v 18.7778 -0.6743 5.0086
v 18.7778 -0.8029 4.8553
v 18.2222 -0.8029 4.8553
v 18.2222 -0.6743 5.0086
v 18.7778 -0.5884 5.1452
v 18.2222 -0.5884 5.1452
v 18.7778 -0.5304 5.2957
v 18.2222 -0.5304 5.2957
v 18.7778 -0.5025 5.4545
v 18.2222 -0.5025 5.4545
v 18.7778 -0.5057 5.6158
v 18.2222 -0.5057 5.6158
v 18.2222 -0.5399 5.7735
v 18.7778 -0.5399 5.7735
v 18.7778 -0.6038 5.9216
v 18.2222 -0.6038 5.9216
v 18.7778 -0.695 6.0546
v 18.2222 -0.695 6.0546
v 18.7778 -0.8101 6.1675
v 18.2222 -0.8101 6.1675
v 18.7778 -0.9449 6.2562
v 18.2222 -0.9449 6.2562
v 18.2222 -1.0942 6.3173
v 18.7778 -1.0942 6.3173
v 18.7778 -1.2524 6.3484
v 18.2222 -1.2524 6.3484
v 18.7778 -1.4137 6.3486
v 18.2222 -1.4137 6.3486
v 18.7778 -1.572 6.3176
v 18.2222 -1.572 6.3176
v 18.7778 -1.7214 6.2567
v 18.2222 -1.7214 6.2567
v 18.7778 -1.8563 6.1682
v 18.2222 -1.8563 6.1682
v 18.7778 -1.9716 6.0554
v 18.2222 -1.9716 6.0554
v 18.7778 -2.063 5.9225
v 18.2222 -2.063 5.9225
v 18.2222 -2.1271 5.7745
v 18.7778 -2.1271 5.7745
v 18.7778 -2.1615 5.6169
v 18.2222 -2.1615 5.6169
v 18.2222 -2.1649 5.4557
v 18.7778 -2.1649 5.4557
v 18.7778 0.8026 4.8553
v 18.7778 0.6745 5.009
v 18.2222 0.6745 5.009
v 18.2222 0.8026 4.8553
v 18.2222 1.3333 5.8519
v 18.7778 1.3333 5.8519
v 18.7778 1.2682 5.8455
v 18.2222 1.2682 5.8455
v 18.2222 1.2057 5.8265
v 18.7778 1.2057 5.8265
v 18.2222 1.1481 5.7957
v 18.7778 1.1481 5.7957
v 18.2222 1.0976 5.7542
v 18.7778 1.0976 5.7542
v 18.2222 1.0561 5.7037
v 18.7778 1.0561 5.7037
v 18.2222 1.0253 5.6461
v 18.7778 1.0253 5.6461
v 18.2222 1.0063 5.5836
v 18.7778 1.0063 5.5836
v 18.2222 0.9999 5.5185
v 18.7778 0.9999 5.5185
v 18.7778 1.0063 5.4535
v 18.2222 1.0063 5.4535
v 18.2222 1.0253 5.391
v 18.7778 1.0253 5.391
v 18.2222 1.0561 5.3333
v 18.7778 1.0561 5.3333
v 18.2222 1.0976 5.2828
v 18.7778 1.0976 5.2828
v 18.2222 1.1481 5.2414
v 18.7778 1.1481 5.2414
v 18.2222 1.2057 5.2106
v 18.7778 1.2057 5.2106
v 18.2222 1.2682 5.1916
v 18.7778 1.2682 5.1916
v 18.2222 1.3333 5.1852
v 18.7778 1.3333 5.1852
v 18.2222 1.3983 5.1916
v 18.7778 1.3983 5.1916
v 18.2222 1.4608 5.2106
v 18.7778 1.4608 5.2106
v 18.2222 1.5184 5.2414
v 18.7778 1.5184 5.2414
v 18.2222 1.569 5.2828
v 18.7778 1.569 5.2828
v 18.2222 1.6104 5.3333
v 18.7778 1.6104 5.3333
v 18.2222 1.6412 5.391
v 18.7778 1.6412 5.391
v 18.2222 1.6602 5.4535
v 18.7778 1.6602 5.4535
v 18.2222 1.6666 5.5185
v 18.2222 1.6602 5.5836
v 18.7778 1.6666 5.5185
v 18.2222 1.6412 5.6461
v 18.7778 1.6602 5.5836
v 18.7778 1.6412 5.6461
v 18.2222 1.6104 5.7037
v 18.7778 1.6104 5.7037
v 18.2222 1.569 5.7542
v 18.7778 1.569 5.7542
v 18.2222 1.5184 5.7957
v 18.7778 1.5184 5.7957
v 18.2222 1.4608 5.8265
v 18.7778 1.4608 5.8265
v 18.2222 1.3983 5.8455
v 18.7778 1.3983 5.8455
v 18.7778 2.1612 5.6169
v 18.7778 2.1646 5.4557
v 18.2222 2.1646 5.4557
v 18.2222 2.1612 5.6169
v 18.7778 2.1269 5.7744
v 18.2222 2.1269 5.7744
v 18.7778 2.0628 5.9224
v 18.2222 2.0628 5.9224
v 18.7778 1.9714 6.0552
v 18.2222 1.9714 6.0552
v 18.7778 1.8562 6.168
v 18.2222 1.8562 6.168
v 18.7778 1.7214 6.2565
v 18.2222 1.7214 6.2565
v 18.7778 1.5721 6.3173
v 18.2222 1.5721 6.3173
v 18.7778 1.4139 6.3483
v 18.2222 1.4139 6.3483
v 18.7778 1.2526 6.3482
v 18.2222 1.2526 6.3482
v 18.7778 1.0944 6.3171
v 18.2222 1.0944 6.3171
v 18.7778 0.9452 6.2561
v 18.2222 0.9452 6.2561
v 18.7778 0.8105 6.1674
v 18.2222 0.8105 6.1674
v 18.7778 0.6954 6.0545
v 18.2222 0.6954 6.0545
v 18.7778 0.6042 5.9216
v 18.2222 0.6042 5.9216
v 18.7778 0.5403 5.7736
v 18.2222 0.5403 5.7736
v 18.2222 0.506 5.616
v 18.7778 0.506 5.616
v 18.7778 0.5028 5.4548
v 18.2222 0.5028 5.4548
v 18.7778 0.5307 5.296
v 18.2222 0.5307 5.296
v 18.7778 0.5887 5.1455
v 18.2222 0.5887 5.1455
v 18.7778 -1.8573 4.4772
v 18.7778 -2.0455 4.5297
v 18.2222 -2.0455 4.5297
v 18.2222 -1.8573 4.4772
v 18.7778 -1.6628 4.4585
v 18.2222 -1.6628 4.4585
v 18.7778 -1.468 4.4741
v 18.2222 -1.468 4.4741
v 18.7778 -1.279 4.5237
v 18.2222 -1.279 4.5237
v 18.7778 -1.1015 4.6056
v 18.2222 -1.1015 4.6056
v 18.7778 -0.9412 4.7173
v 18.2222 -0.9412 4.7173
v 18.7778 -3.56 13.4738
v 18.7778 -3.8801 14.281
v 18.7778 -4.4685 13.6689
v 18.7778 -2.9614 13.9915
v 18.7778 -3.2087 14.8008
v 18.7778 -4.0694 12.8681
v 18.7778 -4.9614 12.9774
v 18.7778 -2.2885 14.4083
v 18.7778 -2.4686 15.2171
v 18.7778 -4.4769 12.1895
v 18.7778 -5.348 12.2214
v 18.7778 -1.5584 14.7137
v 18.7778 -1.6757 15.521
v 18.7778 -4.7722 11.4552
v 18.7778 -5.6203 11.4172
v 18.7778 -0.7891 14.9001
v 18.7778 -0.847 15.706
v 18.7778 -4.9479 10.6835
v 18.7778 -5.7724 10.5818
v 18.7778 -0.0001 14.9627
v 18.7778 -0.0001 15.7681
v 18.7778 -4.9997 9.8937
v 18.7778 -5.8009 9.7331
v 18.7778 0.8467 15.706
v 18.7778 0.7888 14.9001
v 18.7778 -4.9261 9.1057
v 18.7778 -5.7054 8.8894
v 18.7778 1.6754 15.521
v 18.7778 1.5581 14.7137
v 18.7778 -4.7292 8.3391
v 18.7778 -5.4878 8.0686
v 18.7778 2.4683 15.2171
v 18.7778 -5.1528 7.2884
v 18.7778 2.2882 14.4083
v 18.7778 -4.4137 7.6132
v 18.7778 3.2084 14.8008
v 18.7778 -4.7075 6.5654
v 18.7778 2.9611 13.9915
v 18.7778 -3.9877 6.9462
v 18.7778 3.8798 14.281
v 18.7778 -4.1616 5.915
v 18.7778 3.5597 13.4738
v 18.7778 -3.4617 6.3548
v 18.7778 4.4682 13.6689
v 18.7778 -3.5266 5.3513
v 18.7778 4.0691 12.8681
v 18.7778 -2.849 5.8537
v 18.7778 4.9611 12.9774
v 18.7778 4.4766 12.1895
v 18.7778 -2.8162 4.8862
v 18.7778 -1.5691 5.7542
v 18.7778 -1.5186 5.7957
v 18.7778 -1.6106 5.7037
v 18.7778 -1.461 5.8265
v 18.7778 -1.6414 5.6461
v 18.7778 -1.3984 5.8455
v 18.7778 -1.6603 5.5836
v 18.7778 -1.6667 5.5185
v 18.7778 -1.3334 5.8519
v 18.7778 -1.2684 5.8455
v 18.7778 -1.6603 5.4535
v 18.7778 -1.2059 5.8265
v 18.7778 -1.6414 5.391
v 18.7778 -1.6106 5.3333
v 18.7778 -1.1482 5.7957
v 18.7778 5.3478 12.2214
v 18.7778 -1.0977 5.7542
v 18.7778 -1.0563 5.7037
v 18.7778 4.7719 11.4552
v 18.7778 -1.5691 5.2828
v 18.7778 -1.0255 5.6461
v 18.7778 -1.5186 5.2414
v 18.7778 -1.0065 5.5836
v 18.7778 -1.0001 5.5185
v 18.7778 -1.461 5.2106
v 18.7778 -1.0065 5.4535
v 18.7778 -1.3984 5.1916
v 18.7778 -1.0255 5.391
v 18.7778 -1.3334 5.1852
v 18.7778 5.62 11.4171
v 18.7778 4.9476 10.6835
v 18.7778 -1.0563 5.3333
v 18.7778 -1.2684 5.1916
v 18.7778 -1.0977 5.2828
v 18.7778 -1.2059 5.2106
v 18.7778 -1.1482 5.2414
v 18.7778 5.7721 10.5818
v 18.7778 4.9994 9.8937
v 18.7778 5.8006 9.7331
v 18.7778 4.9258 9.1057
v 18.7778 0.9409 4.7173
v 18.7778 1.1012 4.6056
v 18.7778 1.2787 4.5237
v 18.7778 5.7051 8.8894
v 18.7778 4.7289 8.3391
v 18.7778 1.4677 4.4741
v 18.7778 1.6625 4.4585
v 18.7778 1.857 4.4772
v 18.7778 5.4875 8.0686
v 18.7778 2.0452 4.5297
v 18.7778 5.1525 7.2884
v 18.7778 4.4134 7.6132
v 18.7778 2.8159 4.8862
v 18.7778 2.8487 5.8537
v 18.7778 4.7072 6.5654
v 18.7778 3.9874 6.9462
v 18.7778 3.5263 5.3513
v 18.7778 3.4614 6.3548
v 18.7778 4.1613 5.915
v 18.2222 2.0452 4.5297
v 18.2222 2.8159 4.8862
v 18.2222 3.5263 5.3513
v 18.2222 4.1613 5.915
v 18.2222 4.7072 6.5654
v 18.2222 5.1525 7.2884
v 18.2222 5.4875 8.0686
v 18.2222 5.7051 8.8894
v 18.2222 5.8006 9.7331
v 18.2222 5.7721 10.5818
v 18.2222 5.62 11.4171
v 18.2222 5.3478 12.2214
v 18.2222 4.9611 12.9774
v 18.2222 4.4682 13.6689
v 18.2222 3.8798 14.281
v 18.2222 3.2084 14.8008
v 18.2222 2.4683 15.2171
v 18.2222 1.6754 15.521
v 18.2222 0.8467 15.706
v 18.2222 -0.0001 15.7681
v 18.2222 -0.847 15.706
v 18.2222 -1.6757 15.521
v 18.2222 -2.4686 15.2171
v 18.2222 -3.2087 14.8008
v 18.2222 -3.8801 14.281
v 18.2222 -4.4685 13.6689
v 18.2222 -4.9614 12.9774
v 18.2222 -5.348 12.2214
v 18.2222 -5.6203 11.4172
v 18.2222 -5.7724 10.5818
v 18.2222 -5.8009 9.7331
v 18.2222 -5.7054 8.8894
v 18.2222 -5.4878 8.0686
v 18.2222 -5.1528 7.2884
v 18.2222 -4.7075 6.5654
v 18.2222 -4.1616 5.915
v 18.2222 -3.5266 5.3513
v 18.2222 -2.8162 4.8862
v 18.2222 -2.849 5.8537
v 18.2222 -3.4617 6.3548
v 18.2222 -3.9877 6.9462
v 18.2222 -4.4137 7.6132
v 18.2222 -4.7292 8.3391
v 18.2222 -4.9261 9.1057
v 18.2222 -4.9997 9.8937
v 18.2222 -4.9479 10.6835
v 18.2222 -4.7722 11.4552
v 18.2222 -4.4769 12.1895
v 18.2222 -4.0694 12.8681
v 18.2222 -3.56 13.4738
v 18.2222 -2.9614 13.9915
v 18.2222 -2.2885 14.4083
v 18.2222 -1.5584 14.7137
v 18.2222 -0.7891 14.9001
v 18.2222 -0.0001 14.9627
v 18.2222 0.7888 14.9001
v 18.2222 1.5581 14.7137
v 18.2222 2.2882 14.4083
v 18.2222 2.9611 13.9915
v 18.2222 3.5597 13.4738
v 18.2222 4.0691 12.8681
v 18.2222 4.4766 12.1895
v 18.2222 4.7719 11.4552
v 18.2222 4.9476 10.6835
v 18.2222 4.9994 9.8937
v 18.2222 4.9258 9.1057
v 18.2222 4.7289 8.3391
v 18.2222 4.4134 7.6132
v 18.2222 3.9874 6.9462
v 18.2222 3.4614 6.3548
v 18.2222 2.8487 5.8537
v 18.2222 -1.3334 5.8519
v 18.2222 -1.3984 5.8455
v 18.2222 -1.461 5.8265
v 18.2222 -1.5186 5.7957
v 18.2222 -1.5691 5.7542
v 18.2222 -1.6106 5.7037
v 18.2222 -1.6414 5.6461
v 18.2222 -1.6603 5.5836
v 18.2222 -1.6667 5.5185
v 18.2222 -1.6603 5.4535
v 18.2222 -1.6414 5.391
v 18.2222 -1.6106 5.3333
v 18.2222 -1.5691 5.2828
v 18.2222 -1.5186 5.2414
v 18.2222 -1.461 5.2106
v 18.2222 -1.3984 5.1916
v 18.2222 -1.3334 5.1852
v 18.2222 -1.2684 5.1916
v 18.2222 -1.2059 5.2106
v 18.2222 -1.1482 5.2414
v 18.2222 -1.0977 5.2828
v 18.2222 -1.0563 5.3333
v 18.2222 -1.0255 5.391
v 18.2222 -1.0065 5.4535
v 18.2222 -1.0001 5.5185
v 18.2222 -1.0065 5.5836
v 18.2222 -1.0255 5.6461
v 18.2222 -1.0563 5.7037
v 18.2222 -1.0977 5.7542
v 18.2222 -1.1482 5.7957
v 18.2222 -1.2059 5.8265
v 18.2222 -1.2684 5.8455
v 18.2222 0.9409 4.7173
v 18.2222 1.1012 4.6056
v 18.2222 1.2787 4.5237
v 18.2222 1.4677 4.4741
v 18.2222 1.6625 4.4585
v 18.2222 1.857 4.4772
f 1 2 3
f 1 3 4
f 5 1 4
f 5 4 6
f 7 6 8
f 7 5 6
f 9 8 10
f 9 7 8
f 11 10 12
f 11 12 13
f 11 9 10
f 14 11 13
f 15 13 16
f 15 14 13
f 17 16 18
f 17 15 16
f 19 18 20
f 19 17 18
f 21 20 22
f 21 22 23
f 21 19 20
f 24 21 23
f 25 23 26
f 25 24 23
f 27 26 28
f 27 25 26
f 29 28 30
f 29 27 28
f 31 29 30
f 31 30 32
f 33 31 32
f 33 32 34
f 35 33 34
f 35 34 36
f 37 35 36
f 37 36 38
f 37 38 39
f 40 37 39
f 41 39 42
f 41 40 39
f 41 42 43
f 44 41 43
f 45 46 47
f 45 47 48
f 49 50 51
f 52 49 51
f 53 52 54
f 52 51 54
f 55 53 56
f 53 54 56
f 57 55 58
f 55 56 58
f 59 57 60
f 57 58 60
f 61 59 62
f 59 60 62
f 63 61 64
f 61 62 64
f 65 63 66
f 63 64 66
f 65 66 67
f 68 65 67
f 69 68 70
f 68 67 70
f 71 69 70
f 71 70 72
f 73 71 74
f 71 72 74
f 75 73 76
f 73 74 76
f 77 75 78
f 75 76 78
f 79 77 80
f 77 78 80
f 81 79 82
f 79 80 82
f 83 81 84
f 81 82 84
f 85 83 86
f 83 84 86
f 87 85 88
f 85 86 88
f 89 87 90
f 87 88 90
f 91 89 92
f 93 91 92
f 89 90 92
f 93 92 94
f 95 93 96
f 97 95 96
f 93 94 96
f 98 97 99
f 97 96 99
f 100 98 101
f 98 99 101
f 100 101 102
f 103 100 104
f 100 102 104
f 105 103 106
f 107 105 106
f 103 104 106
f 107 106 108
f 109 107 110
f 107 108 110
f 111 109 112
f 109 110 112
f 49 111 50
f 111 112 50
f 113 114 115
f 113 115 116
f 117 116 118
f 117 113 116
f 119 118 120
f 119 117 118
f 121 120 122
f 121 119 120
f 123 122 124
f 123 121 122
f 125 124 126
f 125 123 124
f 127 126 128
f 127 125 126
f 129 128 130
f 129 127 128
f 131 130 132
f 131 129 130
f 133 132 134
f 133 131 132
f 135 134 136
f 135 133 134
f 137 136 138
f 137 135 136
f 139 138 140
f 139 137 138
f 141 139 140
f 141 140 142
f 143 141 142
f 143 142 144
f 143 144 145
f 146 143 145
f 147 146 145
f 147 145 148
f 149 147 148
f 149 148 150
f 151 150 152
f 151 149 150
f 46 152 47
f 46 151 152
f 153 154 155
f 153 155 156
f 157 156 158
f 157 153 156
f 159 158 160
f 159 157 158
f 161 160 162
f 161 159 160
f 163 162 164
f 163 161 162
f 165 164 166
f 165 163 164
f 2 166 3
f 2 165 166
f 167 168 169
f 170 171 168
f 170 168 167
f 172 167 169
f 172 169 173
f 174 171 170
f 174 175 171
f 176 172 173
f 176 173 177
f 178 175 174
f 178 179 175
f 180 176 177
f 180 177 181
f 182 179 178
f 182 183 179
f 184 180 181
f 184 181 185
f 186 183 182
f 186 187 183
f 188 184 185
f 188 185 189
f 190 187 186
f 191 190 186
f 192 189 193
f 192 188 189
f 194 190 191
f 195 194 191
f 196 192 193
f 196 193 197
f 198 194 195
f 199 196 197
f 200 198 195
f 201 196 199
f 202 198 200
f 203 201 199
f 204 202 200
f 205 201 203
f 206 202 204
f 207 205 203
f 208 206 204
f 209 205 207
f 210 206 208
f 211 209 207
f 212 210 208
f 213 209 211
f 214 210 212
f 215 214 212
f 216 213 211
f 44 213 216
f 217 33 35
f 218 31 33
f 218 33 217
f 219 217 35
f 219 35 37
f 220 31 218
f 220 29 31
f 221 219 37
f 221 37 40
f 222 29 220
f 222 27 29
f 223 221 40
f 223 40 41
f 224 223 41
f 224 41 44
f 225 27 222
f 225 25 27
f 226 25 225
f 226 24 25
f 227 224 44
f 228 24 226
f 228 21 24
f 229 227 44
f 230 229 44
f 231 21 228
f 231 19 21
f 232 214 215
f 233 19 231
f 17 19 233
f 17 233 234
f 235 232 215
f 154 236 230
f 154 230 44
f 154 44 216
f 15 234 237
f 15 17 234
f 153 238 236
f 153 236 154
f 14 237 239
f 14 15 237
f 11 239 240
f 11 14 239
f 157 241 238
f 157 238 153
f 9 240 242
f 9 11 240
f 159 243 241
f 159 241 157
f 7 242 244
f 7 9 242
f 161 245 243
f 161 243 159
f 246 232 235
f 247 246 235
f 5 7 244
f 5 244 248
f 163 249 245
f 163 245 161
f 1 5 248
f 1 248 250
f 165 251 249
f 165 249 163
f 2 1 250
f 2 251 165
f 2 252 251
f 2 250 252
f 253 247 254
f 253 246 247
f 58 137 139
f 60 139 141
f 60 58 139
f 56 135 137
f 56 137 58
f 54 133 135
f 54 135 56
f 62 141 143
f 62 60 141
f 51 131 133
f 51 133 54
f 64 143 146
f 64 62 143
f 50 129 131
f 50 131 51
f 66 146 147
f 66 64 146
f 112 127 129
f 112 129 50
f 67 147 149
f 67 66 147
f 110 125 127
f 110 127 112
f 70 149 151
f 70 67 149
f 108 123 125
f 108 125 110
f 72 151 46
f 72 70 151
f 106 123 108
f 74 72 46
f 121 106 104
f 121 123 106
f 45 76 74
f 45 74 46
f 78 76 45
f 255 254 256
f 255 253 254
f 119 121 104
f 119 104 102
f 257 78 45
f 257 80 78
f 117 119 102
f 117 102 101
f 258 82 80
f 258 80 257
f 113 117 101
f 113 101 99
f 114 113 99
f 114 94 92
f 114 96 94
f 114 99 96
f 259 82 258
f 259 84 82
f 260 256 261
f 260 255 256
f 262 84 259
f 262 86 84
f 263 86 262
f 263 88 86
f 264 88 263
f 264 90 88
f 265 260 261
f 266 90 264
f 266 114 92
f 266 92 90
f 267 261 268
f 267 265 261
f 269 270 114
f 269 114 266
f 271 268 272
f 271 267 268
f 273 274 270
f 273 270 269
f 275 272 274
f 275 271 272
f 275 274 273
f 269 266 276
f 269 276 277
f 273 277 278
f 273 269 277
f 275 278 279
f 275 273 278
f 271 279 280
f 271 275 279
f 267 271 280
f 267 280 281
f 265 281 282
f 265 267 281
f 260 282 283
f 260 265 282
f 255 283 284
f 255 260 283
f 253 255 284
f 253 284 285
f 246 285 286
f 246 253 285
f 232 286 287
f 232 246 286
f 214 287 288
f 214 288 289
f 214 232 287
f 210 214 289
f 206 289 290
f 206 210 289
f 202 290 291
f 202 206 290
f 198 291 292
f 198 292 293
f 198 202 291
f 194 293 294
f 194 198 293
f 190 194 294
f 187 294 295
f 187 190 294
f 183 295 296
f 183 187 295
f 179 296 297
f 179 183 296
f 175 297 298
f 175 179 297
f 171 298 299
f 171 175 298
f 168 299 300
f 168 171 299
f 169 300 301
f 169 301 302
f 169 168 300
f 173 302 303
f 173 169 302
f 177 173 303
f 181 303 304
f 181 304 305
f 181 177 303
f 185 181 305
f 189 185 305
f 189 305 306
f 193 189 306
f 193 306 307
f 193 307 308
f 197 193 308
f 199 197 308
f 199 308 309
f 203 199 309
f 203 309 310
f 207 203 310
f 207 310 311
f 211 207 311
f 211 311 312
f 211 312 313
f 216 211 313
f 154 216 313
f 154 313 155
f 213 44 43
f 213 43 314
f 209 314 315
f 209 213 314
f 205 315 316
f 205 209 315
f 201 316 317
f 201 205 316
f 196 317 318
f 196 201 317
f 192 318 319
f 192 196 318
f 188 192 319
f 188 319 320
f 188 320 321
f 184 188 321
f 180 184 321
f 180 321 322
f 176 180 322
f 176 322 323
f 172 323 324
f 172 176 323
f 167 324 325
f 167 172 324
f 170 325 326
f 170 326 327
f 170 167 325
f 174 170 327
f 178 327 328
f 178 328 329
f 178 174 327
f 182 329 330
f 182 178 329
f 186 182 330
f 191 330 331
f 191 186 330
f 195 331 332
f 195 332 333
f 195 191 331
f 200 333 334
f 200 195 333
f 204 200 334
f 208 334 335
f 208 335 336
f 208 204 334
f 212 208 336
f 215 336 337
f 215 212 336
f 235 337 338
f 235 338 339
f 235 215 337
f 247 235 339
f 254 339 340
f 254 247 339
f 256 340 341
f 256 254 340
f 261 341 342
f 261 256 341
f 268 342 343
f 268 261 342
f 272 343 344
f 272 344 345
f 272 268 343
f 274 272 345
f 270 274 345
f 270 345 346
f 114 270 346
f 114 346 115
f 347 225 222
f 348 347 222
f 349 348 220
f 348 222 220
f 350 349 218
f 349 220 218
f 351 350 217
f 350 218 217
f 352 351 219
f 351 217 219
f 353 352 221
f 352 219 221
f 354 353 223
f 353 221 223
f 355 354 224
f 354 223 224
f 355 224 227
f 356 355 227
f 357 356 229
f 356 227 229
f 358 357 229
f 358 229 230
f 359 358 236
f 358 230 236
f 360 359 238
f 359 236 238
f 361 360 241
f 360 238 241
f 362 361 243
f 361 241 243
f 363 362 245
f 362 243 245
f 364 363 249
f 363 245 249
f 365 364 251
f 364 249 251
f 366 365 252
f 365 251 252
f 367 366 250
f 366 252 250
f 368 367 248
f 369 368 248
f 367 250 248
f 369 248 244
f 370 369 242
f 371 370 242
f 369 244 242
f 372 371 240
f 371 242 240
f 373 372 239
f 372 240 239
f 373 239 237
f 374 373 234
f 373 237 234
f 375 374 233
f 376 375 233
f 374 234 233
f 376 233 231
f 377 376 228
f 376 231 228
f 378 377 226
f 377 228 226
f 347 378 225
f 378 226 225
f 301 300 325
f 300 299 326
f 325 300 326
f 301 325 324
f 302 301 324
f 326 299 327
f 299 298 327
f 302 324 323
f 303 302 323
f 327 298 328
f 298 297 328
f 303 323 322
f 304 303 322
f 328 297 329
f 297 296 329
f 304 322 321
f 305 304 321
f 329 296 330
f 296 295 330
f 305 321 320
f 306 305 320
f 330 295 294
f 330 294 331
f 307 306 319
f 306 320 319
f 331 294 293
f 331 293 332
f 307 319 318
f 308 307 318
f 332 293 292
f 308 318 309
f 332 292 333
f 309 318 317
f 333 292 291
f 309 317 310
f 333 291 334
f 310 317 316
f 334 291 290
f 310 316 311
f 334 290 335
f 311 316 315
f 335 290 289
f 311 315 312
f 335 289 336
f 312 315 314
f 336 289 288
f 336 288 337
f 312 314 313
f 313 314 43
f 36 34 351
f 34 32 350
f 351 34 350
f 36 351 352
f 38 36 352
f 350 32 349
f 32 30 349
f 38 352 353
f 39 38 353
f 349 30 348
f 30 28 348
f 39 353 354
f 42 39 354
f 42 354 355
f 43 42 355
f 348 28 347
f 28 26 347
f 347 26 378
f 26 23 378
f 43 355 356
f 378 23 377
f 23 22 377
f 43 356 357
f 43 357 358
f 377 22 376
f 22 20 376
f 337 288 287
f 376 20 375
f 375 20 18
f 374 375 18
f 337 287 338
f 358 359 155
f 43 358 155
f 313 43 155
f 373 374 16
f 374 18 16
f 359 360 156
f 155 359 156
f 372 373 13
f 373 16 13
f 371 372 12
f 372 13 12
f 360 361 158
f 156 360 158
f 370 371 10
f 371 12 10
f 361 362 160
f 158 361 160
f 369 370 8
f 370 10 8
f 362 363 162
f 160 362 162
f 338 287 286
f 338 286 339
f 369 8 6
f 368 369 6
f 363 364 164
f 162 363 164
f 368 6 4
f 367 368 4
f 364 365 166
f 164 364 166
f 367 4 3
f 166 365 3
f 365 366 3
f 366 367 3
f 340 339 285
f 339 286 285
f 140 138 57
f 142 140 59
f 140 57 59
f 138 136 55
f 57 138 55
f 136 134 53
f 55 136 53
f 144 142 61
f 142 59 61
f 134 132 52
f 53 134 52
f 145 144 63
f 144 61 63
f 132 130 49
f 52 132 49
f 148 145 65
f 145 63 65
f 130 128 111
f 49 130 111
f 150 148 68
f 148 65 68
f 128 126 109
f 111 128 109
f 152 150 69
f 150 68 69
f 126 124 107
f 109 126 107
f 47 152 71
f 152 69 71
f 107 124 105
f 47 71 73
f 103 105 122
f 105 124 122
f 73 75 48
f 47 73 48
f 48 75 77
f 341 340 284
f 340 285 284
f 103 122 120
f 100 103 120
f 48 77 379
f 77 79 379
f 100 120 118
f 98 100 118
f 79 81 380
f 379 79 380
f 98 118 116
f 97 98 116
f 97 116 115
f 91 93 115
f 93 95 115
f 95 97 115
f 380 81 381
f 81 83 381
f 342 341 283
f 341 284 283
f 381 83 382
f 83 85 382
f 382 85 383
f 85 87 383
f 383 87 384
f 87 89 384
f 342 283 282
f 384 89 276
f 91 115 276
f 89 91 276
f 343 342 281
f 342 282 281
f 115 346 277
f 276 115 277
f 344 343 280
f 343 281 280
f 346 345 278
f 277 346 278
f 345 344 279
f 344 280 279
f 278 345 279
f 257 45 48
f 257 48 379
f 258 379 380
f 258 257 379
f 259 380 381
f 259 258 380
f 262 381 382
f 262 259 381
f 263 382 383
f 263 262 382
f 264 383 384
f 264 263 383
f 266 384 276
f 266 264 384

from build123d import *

# Parameters (mm, degrees)
SKETCH1_R           = 0.6
BOSS_EXTRUDE1_DEPTH = 1
SCALE1_SCALE        = 0.555555556


with BuildPart() as part:
    # Sketch1 → Boss-Extrude1 (new body)
    with BuildSketch(Plane(origin=(19, 0, 0), x_dir=(0, 0, -1), z_dir=(1, 0, 0))):
        with BuildLine():
            Line((-1.082906578, 1.214226965), (-0.806260325, 1.444819657))
            ThreePointArc((-0.806260325, 1.444819657), (-0.157167996, 2.46989624), (-0.220083072, 3.681566388))
            ThreePointArc((-0.220083072, 3.681566388), (-20.449170804, -0.000103807), (-0.220095755, -3.681843689))
            ThreePointArc((-0.220095755, -3.681843689), (-0.157177378, -2.470170425), (-0.806270581, -1.44509051))
            Line((-0.806270581, -1.44509051), (-1.082193901, -1.213563353))
            ThreePointArc((-1.082193901, -1.213563353), (-3.437745717, -1.969386585), (-1.886859109, -3.896727719))
            ThreePointArc((-1.886859109, -3.896727719), (-18.999593972, -0.000121806), (-1.886859109, 3.896484108))
            ThreePointArc((-1.886859109, 3.896484108), (-3.437385157, 1.97013231), (-1.082906578, 1.214226965))
        make_face()
        with Locations(Location((-2.00000003, -2.4, 0), (0, 0, 180))):
            Circle(SKETCH1_R, mode=Mode.SUBTRACT)
        with Locations(Location((-2.00000003, 2.4, 0), (0, 0, 180))):
            Circle(SKETCH1_R, mode=Mode.SUBTRACT)
    extrude(amount=-BOSS_EXTRUDE1_DEPTH)


with BuildPart() as part_1:
    # Scale1: scaled about (18.5, -0.000178585, 9.916688181)
    add(part.part.scale(SCALE1_SCALE).moved(Location((8.222222222, -7.9371e-05, 4.407416969))))


solid = part_1.part
